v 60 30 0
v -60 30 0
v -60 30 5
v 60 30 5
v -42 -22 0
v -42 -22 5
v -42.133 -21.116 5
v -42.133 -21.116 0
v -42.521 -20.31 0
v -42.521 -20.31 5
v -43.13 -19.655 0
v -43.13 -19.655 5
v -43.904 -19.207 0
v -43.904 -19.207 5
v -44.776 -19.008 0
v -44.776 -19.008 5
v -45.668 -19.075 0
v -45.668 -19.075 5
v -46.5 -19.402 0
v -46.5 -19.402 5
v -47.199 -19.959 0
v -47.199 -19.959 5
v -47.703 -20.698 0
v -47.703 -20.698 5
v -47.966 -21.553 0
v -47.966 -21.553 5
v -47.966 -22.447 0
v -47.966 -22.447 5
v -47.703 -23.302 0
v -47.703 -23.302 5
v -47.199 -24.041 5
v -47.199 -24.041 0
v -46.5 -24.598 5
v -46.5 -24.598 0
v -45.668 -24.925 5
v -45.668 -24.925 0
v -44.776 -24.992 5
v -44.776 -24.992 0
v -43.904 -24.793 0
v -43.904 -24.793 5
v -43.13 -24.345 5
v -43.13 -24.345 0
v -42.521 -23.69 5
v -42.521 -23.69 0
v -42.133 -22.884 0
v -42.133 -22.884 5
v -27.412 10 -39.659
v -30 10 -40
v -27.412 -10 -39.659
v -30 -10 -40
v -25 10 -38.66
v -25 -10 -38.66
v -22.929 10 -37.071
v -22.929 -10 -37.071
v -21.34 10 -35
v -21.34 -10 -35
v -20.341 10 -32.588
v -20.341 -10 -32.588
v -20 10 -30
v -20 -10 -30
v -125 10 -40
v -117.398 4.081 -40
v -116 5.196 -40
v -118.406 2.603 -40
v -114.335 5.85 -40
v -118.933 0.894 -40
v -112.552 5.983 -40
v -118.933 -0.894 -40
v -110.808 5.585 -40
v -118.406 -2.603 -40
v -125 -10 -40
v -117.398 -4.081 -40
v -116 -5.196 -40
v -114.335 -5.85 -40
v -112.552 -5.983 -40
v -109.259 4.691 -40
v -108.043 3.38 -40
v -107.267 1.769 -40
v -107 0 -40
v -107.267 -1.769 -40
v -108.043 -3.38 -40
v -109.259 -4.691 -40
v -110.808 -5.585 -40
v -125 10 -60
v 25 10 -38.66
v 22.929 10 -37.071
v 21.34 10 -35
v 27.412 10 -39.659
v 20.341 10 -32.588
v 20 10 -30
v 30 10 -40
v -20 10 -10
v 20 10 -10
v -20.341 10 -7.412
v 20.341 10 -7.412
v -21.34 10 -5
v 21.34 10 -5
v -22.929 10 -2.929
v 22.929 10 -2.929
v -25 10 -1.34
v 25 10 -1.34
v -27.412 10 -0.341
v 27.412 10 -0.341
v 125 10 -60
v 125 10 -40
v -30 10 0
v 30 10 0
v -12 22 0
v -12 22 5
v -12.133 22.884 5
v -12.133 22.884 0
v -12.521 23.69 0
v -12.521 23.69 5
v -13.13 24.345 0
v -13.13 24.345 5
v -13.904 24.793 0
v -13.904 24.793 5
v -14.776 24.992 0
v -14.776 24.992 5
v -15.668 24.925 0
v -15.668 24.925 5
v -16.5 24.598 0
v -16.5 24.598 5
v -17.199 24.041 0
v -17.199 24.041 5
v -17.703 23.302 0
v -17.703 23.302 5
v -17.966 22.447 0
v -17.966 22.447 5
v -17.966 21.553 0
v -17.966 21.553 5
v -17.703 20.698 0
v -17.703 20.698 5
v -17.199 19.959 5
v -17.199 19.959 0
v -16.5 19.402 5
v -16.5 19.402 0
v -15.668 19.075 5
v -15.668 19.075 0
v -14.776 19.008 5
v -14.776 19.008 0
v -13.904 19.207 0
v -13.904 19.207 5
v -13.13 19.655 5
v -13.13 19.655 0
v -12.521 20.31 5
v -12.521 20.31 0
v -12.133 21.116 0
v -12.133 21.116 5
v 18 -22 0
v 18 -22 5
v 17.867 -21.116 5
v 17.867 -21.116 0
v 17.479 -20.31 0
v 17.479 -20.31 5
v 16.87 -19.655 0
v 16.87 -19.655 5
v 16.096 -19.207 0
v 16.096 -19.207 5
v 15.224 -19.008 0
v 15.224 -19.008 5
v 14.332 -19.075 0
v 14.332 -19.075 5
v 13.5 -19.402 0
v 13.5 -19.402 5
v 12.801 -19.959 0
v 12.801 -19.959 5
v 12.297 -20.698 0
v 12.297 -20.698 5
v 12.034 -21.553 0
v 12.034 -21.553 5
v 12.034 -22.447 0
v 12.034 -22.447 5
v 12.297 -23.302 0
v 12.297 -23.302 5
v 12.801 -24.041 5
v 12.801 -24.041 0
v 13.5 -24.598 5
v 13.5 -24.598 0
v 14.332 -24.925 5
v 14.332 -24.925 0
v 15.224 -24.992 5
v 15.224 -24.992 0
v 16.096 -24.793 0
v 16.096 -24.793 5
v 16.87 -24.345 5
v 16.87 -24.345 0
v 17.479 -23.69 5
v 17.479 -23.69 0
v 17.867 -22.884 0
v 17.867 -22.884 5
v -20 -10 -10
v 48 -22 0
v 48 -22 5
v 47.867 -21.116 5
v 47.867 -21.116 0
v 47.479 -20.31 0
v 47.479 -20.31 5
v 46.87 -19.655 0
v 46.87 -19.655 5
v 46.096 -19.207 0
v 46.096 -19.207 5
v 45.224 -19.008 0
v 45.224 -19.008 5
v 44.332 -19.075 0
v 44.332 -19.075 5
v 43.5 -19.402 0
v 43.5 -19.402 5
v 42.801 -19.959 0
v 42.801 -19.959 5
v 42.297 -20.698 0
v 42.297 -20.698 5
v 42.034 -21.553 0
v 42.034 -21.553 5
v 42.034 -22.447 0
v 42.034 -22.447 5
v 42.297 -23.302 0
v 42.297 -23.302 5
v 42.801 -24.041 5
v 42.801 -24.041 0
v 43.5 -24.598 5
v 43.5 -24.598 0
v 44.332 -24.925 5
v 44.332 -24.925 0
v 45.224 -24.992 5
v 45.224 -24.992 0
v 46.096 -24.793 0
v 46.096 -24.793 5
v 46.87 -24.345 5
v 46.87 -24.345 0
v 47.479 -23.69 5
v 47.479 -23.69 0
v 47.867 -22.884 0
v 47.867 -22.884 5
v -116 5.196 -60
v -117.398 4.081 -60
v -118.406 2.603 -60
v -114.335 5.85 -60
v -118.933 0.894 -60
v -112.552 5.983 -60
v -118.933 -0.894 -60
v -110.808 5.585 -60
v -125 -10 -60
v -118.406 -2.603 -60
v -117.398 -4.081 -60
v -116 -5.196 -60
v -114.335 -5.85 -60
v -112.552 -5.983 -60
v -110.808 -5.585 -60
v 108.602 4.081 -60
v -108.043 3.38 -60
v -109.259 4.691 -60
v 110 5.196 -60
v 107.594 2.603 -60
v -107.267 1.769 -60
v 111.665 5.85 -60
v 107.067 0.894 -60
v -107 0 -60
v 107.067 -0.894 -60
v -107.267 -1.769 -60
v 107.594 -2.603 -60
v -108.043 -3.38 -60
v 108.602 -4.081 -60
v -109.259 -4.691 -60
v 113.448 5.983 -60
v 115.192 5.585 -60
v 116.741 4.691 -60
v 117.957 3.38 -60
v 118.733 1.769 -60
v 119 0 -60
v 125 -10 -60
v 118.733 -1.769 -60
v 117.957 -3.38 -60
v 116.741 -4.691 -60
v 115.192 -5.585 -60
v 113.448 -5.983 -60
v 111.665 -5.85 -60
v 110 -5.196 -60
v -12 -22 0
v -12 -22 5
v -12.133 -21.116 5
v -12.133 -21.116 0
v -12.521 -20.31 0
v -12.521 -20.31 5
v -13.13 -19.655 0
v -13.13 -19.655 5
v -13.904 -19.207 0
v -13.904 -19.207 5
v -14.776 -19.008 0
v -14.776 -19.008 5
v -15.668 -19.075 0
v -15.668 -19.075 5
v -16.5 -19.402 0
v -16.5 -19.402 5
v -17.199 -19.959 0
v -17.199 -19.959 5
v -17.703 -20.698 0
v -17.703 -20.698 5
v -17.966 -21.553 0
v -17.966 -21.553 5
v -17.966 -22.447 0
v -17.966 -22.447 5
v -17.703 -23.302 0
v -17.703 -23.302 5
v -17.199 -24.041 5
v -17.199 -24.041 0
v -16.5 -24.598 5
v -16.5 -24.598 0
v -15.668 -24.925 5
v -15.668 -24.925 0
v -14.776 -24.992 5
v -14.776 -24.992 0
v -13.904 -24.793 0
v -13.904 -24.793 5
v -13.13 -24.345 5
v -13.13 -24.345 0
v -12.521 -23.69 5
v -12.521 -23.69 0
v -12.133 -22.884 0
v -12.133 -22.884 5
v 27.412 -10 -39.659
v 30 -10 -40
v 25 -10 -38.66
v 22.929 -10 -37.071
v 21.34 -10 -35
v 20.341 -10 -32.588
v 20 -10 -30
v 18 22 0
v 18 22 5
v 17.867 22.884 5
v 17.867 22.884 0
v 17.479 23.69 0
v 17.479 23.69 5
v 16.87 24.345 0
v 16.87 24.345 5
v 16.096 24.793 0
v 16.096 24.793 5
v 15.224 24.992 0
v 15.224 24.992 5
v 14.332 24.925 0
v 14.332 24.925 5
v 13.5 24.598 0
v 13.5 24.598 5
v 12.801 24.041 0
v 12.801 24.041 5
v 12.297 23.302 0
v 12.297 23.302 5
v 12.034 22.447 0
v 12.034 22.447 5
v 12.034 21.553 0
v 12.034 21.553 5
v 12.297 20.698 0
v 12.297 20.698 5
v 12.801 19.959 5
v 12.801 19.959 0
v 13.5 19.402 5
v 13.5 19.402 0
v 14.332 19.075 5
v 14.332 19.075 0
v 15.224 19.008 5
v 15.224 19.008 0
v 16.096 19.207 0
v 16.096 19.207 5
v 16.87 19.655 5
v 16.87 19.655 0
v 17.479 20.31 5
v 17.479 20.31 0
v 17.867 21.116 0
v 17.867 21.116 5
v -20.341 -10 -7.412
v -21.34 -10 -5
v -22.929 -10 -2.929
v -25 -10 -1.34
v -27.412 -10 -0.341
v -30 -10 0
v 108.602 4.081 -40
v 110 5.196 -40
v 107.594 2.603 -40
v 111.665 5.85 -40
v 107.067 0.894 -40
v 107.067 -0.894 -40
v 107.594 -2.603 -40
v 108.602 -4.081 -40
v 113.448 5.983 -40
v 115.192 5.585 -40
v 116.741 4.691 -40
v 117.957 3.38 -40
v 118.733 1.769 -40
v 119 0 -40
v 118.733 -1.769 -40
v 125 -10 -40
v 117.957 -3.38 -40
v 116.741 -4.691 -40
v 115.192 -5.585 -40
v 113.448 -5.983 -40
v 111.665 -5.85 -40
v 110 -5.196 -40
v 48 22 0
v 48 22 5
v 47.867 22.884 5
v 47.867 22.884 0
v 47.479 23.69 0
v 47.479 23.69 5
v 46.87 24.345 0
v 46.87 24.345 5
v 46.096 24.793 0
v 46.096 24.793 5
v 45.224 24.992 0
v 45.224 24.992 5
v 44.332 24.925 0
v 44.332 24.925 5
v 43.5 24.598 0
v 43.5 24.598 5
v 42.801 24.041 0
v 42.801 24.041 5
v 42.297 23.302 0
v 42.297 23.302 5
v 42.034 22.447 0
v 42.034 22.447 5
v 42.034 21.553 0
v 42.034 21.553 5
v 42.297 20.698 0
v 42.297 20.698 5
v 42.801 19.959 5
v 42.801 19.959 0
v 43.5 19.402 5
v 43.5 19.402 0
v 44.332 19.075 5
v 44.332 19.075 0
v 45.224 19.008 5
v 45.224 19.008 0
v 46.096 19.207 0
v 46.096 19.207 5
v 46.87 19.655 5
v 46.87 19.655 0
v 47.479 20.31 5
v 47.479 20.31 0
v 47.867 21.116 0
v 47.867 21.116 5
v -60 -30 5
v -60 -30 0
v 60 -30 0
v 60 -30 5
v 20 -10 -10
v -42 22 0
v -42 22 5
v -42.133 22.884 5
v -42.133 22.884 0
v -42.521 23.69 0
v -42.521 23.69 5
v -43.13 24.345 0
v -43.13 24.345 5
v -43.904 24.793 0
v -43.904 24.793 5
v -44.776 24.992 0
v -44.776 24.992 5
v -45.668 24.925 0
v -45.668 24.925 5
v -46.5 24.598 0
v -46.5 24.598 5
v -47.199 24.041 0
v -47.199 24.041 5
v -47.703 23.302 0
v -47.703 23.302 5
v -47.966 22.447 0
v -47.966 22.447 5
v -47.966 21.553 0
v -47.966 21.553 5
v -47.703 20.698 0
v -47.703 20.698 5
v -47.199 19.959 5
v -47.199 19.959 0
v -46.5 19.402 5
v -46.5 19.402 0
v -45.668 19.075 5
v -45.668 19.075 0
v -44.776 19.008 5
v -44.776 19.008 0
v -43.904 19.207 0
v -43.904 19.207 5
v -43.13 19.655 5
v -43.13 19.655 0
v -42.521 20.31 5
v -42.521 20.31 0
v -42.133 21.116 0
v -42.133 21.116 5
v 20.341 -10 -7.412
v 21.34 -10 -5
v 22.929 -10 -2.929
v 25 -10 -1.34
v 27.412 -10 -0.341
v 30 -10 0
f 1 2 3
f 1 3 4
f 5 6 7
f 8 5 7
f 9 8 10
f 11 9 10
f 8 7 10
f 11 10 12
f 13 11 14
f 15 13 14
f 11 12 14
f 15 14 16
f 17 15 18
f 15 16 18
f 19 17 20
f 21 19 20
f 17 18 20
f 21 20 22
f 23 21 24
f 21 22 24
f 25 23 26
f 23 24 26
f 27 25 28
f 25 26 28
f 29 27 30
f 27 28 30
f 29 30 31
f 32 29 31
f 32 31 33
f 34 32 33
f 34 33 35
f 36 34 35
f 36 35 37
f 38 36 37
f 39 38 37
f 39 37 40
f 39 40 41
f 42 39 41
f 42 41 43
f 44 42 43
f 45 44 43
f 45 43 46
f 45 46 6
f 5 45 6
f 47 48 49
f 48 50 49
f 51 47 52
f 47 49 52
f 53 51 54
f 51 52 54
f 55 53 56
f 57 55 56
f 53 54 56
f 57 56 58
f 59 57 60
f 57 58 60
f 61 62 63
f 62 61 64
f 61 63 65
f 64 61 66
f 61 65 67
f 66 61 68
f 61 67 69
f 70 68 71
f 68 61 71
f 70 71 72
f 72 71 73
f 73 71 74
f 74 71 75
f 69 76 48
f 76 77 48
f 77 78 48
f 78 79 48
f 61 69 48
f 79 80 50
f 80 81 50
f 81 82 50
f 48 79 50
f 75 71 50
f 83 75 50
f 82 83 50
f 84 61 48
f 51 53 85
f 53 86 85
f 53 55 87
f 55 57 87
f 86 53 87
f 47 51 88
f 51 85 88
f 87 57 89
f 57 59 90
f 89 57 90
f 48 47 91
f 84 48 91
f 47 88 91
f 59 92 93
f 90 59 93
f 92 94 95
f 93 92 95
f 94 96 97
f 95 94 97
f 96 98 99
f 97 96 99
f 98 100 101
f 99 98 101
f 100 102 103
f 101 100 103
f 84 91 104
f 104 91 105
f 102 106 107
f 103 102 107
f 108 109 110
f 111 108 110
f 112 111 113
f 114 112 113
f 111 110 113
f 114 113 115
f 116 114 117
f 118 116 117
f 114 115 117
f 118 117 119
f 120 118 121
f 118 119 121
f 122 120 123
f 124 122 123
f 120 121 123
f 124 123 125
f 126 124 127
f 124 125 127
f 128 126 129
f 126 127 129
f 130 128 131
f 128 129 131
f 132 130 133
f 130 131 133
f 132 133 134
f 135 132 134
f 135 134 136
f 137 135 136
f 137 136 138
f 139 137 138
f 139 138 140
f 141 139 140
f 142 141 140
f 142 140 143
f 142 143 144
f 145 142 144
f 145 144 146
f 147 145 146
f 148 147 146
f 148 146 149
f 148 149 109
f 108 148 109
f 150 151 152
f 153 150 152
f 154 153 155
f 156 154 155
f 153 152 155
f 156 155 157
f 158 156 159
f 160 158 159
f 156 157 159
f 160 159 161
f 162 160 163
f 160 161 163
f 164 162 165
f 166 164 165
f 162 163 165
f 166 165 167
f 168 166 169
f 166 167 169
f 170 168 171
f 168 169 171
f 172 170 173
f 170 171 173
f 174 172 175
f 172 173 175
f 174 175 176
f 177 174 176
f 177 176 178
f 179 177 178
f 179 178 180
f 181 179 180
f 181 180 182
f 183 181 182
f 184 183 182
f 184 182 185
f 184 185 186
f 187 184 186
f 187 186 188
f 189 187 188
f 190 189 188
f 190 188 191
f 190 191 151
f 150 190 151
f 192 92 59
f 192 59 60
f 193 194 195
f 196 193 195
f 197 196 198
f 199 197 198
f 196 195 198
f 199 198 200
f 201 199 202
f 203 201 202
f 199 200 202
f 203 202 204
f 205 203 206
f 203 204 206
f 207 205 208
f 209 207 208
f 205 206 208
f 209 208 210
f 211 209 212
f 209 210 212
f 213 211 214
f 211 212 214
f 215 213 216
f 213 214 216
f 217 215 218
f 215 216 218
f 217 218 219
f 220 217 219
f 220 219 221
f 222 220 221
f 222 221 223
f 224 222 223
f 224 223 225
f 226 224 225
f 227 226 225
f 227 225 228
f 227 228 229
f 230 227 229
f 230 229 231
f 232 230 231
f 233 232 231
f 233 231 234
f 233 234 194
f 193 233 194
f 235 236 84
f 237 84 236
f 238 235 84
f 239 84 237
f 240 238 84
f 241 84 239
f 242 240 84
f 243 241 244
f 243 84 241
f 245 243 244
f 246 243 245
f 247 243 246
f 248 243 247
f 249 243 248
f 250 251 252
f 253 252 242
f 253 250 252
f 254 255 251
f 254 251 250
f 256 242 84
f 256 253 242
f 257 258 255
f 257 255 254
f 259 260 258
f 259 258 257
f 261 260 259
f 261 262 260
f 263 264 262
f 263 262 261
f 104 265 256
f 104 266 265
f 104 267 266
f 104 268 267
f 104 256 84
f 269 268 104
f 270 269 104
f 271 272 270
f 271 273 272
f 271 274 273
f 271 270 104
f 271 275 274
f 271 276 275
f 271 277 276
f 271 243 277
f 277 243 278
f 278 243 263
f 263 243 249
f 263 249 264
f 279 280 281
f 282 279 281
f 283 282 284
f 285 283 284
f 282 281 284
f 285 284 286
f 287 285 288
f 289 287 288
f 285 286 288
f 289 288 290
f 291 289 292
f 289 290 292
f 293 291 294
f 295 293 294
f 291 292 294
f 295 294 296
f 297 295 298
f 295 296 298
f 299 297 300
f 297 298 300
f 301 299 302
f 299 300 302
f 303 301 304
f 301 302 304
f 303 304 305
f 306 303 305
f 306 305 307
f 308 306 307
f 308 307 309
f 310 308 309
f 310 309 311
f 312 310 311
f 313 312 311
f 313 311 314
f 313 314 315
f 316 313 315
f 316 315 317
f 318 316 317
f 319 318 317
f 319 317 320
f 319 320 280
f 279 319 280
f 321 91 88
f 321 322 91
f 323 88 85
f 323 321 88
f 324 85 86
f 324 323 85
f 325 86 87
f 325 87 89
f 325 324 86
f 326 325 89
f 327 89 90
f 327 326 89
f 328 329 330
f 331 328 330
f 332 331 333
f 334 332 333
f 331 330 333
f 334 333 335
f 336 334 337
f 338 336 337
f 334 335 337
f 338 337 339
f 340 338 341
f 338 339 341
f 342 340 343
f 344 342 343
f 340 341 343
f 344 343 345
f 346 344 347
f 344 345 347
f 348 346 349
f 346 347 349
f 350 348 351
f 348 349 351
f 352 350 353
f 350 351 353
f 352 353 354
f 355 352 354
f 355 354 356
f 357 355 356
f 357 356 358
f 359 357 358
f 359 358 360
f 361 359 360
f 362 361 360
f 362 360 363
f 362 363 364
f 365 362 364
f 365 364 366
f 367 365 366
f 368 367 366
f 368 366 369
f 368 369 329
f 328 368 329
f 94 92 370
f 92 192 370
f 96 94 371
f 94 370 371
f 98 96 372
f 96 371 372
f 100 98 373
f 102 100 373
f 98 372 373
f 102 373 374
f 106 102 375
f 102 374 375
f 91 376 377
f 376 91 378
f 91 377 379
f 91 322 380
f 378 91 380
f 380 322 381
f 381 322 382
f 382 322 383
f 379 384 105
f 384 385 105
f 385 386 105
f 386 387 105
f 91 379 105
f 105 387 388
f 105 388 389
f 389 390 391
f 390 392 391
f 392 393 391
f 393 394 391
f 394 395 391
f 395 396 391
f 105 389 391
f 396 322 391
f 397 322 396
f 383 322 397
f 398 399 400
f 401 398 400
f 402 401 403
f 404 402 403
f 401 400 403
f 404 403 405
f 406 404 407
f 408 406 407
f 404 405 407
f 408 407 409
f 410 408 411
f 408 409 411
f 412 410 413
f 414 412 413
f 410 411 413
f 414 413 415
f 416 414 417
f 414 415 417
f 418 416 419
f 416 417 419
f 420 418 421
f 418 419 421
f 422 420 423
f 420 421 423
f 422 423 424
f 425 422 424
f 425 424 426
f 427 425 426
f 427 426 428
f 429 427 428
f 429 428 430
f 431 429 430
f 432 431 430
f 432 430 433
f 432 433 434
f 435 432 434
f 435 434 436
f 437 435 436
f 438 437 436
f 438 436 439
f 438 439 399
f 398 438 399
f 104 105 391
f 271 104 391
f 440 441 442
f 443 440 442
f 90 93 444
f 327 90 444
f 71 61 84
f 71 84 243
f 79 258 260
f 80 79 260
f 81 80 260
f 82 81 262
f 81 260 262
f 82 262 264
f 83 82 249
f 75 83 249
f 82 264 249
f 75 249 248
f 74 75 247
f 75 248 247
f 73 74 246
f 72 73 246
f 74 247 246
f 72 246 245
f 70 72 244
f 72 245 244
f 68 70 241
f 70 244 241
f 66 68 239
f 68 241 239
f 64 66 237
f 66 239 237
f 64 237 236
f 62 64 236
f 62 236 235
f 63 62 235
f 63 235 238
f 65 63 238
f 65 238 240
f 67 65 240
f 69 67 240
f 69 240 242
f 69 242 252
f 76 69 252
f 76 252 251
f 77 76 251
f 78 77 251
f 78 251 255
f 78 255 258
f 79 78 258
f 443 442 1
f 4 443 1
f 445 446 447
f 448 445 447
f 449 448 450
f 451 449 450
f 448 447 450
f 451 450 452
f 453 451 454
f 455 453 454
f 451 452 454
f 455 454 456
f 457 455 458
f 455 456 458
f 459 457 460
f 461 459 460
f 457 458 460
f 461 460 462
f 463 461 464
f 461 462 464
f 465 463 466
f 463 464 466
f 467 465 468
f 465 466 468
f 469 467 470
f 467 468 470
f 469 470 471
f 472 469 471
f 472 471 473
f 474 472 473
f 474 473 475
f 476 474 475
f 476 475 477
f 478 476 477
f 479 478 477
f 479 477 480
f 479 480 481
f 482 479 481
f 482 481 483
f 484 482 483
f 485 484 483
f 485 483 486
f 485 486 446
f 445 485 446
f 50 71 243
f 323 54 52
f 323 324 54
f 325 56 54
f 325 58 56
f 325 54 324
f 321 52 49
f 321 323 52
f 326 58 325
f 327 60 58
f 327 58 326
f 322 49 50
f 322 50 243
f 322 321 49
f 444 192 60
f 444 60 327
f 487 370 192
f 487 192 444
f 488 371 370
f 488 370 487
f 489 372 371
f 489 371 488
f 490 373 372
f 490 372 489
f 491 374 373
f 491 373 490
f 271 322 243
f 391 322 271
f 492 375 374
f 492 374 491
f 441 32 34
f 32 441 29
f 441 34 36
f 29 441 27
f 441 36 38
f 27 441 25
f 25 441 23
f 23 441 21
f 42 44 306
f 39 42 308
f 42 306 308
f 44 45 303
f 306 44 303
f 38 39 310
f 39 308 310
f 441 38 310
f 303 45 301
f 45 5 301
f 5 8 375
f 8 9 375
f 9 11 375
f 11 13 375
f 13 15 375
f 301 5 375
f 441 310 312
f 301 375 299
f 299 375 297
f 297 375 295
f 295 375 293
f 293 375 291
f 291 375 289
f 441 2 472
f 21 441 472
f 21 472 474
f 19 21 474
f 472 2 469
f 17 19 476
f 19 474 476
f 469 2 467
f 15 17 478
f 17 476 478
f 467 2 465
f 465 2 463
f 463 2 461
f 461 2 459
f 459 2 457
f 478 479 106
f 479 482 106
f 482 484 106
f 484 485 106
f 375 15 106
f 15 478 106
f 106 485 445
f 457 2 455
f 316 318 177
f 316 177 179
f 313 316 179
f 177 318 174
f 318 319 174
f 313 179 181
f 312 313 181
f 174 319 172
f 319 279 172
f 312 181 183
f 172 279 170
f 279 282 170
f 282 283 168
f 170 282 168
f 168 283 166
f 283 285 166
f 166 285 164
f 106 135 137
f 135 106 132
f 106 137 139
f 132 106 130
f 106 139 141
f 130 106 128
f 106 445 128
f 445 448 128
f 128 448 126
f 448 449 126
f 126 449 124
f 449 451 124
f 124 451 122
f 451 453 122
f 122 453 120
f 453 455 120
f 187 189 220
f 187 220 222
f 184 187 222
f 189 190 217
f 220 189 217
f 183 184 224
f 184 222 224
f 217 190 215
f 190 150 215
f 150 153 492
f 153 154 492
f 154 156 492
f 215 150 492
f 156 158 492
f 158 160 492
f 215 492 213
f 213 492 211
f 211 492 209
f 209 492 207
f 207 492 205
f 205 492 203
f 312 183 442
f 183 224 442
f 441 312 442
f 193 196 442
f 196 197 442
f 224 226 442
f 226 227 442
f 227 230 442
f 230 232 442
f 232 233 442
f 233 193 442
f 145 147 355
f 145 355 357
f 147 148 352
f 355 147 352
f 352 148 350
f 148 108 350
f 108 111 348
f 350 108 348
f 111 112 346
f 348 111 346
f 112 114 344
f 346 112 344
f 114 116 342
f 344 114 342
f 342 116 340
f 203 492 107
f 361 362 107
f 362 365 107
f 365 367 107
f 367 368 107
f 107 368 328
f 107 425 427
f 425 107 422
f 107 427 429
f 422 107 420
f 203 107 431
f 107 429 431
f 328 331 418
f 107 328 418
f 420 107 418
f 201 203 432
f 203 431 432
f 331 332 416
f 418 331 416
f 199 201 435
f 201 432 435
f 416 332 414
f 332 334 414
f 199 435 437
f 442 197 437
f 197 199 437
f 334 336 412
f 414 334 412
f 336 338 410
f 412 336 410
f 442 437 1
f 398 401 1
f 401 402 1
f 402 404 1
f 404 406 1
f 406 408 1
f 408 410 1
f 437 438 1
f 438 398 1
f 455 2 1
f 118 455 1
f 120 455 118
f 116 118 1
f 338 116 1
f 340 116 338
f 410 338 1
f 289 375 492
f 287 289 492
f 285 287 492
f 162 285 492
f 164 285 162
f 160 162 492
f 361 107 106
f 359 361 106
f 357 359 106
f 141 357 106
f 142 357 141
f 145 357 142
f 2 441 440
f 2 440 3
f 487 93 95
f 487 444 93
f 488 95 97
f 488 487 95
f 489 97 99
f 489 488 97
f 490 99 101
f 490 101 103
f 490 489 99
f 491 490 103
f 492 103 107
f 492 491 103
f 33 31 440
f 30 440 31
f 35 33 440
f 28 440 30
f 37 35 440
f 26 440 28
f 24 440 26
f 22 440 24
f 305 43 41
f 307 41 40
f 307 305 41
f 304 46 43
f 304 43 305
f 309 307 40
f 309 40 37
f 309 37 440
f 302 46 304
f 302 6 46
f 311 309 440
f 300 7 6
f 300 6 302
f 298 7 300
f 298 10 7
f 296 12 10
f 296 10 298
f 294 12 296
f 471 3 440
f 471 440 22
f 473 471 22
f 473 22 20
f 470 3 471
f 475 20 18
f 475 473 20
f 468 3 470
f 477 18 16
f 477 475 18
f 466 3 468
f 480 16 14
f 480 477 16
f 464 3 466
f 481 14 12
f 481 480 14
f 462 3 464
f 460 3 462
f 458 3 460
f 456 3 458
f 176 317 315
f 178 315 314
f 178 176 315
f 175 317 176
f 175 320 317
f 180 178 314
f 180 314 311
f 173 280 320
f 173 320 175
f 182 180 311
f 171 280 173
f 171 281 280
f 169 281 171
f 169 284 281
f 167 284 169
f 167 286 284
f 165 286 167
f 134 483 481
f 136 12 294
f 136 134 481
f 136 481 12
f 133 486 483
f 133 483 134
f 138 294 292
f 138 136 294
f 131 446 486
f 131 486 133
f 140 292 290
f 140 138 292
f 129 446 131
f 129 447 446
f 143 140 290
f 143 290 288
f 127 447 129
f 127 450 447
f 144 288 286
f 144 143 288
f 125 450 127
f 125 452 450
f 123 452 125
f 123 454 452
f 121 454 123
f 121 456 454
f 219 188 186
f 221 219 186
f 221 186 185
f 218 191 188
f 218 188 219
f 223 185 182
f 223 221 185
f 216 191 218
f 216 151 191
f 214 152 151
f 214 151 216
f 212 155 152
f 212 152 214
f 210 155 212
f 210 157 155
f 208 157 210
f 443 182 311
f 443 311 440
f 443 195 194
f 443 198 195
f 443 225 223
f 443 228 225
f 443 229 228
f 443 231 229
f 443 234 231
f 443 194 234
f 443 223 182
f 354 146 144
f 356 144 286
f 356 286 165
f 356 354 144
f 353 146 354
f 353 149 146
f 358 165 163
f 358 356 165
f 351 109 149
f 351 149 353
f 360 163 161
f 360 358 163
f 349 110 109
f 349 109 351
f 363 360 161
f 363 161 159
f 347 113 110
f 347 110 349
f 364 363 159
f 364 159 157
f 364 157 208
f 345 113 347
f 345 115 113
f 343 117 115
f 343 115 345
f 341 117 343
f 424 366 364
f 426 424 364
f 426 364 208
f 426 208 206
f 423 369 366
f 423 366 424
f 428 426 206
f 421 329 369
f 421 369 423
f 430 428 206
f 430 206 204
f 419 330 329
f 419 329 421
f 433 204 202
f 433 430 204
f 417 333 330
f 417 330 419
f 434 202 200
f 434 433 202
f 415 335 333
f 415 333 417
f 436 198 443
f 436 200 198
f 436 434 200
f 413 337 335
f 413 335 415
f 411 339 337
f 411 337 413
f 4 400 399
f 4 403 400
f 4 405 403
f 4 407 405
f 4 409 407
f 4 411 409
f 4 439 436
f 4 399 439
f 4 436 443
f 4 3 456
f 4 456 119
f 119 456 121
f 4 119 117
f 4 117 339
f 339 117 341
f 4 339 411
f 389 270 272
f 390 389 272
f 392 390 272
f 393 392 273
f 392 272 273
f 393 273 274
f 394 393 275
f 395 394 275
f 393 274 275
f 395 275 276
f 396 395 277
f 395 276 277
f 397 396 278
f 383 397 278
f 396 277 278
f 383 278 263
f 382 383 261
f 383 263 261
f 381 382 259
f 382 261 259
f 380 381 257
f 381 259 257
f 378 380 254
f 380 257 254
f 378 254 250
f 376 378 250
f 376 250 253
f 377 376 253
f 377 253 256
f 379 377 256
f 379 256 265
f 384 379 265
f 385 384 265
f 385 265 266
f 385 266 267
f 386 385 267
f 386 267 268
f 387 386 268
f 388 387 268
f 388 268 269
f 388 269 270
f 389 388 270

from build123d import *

# Parameters (mm, degrees)
F0_W      = 120
F0_H      = 60
F1_DEPTH  = 5
F2_W      = 40
F2_H      = 20
F3_DEPTH  = 40
F4_W      = 250
F4_H      = 20
F5_DEPTH  = 20
F6_R      = 10
F7_R      = 6
F8_DEPTH  = 65.001
F9_R      = 3
F10_DEPTH = 65.001


with BuildPart() as f1:
    # F0 (on Top) → F1 (new body)
    with BuildSketch(Plane.XY):
        Rectangle(F0_W, F0_H)
    extrude(amount=F1_DEPTH)

    # F2 (on face) → F3 (join)
    with BuildSketch(Plane(origin=(0, 0, 0), x_dir=(1, 0, 0), z_dir=(0, 0, -1))):
        Rectangle(F2_W, F2_H)
    extrude(amount=F3_DEPTH)

    # F4 (on face) → F5 (join)
    with BuildSketch(Plane(origin=(0, 0, -40), x_dir=(1, 0, 0), z_dir=(0, 0, -1))):
        Rectangle(F4_W, F4_H)
    extrude(amount=F5_DEPTH)

    # F6
    f6_edges = [f1.edges().sort_by_distance(p)[0] for p in [
        (-20, 0, -40),
        (20, 0, -40),
        (20, 0, 0),
        (-20, 0, 0),
    ]]
    fillet(f6_edges, radius=F6_R)

    # F7 (on face) → F8 (cut, through all)
    with BuildSketch(Plane(origin=(0, 0, -60), x_dir=(1, 0, 0), z_dir=(0, 0, -1))):
        with Locations((-113, 0)):
            Circle(F7_R)
        with Locations((113, 0)):
            Circle(F7_R)
    extrude(amount=-F8_DEPTH, mode=Mode.SUBTRACT)

    # F9 (on face) → F10 (cut, through all)
    with BuildSketch(Plane.XY.offset(5)):
        with Locations((-15, 22)):
            Circle(F9_R)
        with Locations((15, 22)):
            Circle(F9_R)
        with Locations((-15, -22)):
            Circle(F9_R)
        with Locations((15, -22)):
            Circle(F9_R)
        with Locations((-45, 22)):
            Circle(F9_R)
        with Locations((-45, -22)):
            Circle(F9_R)
        with Locations((45, 22)):
            Circle(F9_R)
        with Locations((45, -22)):
            Circle(F9_R)
    extrude(amount=-F10_DEPTH, mode=Mode.SUBTRACT)


solid = f1.part
